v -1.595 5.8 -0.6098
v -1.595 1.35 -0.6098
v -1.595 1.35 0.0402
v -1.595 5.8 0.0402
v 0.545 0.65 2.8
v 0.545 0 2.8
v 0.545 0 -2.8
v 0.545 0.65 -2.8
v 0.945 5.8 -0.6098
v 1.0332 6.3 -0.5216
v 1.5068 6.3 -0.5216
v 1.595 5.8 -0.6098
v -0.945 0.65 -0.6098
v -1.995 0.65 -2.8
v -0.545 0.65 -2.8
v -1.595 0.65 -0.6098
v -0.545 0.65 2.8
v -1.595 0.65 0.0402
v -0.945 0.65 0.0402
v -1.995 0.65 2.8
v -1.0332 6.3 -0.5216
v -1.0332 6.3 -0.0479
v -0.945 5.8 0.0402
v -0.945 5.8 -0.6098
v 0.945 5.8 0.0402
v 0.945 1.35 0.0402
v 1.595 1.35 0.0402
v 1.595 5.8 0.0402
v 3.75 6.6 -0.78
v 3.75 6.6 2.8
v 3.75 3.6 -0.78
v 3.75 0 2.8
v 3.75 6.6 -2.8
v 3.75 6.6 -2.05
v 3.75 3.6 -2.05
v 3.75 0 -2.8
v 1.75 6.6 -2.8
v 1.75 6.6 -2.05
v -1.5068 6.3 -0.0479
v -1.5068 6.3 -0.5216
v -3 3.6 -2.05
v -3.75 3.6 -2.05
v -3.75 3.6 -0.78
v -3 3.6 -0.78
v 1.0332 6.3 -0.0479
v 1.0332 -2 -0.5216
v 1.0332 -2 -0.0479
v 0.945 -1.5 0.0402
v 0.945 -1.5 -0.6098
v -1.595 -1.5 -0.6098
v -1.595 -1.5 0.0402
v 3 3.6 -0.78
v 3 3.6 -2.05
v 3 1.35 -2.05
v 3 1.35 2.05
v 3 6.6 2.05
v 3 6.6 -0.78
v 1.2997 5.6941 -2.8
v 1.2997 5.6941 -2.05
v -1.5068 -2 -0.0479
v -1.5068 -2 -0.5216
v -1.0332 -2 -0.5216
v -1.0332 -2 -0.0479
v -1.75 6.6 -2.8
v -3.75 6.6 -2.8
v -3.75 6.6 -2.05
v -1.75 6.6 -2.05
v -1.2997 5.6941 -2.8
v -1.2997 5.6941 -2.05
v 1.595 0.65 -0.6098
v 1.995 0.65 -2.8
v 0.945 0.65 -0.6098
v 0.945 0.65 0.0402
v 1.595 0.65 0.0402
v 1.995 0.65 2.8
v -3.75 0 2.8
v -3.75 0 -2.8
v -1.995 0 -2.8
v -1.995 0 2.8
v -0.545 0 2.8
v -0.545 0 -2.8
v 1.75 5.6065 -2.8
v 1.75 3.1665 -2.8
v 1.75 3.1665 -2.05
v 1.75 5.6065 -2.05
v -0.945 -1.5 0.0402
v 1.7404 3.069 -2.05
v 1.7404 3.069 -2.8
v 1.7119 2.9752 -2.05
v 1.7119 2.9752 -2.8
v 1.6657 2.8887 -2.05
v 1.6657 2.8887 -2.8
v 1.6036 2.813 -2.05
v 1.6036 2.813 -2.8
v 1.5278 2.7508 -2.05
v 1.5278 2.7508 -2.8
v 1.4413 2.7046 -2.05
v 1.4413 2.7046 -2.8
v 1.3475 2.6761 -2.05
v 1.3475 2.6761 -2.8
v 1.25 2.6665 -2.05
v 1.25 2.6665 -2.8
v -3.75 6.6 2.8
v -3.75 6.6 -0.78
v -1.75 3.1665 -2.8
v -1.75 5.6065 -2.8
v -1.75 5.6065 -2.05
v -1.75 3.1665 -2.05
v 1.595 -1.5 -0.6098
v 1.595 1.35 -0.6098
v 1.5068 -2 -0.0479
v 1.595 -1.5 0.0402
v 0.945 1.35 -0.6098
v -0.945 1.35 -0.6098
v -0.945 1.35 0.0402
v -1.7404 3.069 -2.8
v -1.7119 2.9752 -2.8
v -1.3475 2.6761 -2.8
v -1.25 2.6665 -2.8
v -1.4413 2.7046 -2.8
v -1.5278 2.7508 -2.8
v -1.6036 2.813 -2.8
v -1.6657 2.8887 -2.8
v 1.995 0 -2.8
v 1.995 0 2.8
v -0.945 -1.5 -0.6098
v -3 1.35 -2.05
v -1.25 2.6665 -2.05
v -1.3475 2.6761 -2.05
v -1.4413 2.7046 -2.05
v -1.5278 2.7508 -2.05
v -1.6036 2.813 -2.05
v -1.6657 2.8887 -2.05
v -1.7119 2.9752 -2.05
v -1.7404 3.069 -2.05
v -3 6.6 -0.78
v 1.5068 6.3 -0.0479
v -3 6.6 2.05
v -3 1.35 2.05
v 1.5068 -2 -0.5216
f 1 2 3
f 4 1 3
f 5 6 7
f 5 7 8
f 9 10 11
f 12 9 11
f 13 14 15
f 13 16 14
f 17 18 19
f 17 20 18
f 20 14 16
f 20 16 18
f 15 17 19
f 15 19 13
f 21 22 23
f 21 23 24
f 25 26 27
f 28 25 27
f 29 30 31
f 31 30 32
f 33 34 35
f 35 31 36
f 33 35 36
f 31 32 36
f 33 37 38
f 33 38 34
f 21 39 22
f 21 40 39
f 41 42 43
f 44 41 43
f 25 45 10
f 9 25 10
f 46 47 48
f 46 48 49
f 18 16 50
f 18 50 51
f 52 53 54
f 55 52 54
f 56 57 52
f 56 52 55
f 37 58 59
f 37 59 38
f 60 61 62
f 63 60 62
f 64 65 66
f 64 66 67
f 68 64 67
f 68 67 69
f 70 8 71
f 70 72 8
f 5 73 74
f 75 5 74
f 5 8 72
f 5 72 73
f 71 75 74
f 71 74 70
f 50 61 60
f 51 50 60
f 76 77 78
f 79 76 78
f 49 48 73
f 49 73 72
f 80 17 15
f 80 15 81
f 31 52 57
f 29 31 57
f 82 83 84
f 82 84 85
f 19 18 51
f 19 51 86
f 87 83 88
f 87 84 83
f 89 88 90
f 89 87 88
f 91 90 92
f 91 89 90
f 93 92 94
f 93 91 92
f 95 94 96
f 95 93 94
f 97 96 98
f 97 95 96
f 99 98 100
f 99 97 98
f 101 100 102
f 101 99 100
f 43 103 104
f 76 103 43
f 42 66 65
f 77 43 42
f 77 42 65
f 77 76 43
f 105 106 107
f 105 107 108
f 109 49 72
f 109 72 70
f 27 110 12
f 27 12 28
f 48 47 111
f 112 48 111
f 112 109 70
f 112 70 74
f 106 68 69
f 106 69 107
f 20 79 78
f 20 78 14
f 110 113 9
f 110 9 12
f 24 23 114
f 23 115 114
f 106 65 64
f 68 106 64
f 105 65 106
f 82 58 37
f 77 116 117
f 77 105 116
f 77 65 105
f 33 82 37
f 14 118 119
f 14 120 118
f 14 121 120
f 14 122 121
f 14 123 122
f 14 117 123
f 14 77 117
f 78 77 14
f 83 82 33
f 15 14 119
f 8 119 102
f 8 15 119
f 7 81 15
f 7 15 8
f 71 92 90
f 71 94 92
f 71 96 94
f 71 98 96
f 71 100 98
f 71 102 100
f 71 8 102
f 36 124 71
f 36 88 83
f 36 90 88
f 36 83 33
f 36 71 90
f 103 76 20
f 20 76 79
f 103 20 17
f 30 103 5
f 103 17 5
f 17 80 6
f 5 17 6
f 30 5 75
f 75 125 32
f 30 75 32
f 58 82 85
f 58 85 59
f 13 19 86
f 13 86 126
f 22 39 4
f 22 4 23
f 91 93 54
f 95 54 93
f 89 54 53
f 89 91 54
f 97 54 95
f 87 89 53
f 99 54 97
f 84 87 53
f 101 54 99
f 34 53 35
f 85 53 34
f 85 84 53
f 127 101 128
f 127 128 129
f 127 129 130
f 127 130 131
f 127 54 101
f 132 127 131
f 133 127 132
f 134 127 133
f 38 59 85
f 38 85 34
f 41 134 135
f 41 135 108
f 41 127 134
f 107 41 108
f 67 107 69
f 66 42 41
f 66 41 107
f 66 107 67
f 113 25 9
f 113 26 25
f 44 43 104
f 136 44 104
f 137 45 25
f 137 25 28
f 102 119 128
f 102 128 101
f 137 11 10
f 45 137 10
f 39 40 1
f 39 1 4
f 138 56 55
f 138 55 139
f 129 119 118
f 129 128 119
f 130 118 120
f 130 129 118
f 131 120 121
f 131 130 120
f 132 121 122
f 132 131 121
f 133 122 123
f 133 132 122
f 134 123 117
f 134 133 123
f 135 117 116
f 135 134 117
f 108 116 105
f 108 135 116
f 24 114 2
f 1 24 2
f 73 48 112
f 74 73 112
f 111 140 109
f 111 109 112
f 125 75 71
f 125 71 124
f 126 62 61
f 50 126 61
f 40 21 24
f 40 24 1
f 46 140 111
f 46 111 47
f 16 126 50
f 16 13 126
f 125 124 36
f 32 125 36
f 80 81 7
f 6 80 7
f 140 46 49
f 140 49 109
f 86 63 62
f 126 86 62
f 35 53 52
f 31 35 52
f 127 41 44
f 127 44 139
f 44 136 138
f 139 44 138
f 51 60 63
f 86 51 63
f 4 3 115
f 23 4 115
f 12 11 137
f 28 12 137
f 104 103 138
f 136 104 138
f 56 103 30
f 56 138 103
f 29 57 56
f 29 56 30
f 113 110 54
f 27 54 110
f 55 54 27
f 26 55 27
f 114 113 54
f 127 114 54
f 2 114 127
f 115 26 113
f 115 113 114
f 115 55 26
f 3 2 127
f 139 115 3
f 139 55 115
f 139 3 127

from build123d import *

# Parameters (mm, degrees)
SKETCH1_W              = 7.5
SKETCH1_H              = 5.6
EXTRUDE1_DEPTH         = 6.6
CUT_EXTRUDE1_DEPTH     = 6.6
SKETCH3_W              = 6
SKETCH3_H              = 4.1
CUT_EXTRUDE2_DEPTH     = 5.25
SKETCH5_W              = 1.27
SKETCH5_H              = 3
CUT_EXTRUDE3_DEPTH     = 8.5
CUT_EXTRUDE4_DEPTH     = 1.2
FILLET1_R              = 0.5
EXTRUDE2_DEPTH         = 6.3
EXTRUDE2_DEPTH_BACK    = 2
CHAMFER1_SIZE          = 0.5
CHAMFER1_SIZE2         = 0.08816349
CHAMFER1_PART_2_SIZE   = 0.5
CHAMFER1_PART_2_SIZE2  = 0.08816349
CHAMFER1_PART_3_SIZE   = 0.5
CHAMFER1_PART_3_SIZE2  = 0.08816349
CHAMFER1_PART_4_SIZE   = 0.5
CHAMFER1_PART_4_SIZE2  = 0.08816349
CHAMFER1_PART_5_SIZE   = 0.5
CHAMFER1_PART_5_SIZE2  = 0.08816349
CHAMFER1_PART_6_SIZE   = 0.5
CHAMFER1_PART_6_SIZE2  = 0.08816349
CHAMFER1_PART_7_SIZE   = 0.5
CHAMFER1_PART_7_SIZE2  = 0.08816349
CHAMFER1_PART_8_SIZE   = 0.5
CHAMFER1_PART_8_SIZE2  = 0.08816349
CHAMFER1_PART_9_SIZE   = 0.5
CHAMFER1_PART_9_SIZE2  = 0.08816349
CHAMFER1_PART_10_SIZE  = 0.5
CHAMFER1_PART_10_SIZE2 = 0.08816349
CHAMFER1_PART_11_SIZE  = 0.5
CHAMFER1_PART_11_SIZE2 = 0.08816349
CHAMFER1_PART_12_SIZE  = 0.5
CHAMFER1_PART_12_SIZE2 = 0.08816349
CHAMFER1_PART_13_SIZE  = 0.5
CHAMFER1_PART_13_SIZE2 = 0.08816349
CHAMFER1_PART_14_SIZE  = 0.5
CHAMFER1_PART_14_SIZE2 = 0.08816349
CHAMFER1_PART_15_SIZE  = 0.5
CHAMFER1_PART_15_SIZE2 = 0.08816349
CHAMFER1_PART_16_SIZE  = 0.5
CHAMFER1_PART_16_SIZE2 = 0.08816349


with BuildPart() as part:
    # Sketch1 → Extrude1 (new body)
    with BuildSketch(Plane(origin=(0, 0, 0), x_dir=(1, 0, 0), z_dir=(0, 1, 0))):
        Rectangle(SKETCH1_W, SKETCH1_H)
    extrude(amount=EXTRUDE1_DEPTH)

    # Sketch2 → Cut-Extrude1 (cut, through all)
    with BuildSketch(Plane.XY.offset(2.8)):
        Polygon((-1.995, 0.65), (-0.545, 0.65), (-0.545, 0), (-1.27, 0), (-1.995, 0), align=None)
        Polygon((0.545, 0.65), (1.995, 0.65), (1.995, 0), (1.27, 0), (0.545, 0), align=None)
    extrude(amount=-CUT_EXTRUDE1_DEPTH, mode=Mode.SUBTRACT)

    # Sketch3 → Cut-Extrude2 (cut)
    with BuildSketch(Plane(origin=(0, 6.6, 0), x_dir=(-1, 0, 0), z_dir=(0, 1, 0))):
        Rectangle(SKETCH3_W, SKETCH3_H)
    extrude(amount=-CUT_EXTRUDE2_DEPTH, mode=Mode.SUBTRACT)

    # Sketch5 → Cut-Extrude3 (cut, through all)
    with BuildSketch(Plane.ZY.offset(3.75)):
        with Locations((-1.415, 5.1)):
            Rectangle(SKETCH5_W, SKETCH5_H)
    extrude(amount=-CUT_EXTRUDE3_DEPTH, mode=Mode.SUBTRACT)

    # Sketch6 → Cut-Extrude4 (cut)
    with BuildSketch(Plane(origin=(0, 0, -2.8), x_dir=(-1, 0, 0), z_dir=(0, 0, -1))):
        Polygon((-1.75, 6.6), (1.75, 6.6), (1.299695014, 5.694073356), (1.75, 5.606485511), (1.75, 2.666508092), (-1.75, 2.666508092), (-1.75, 5.606485511), (-1.299695014, 5.694073356), align=None)
    extrude(amount=-CUT_EXTRUDE4_DEPTH, mode=Mode.SUBTRACT)

    # Fillet1
    fillet1_edges = [part.edges().sort_by_distance(p)[0] for p in [
        (-1.75, 2.666508092, -2.425),
        (1.75, 2.666508092, -2.425),
    ]]
    fillet(fillet1_edges, radius=FILLET1_R)

    # Sketch7 → Extrude2 (add, two sides)
    with BuildSketch(Plane(origin=(0, 0, 0), x_dir=(1, 0, 0), z_dir=(0, 1, 0))) as extrude2_sk:
        Polygon((-1.27, -0.040243902), (-0.945, -0.040243902), (-0.945, 0.609756098), (-1.595, 0.609756098), (-1.595, -0.040243902), align=None)
        Polygon((1.27, -0.040243902), (0.945, -0.040243902), (0.945, 0.609756098), (1.595, 0.609756098), (1.595, -0.040243902), align=None)
    extrude(amount=EXTRUDE2_DEPTH)
    extrude(extrude2_sk.sketch, amount=-EXTRUDE2_DEPTH_BACK)

    # Chamfer1
    chamfer1_edges = [part.edges().sort_by_distance(p)[0] for p in [
        (-1.595, -2, -0.284756098),
    ]]
    chamfer1_side = [part.faces().sort_by_distance(p)[0] for p in [
        (-1.595, -0.675, -0.284756098),
    ]]
    chamfer(chamfer1_edges, length=CHAMFER1_SIZE, length2=CHAMFER1_SIZE2, reference=chamfer1_side[0])

    # Chamfer1 part 2
    chamfer1_part_2_edges = [part.edges().sort_by_distance(p)[0] for p in [
        (-1.27, -2, 0.040243902),
    ]]
    chamfer1_part_2_side = [part.faces().sort_by_distance(p)[0] for p in [
        (-1.27, -0.675, 0.040243902),
    ]]
    chamfer(chamfer1_part_2_edges, length=CHAMFER1_PART_2_SIZE, length2=CHAMFER1_PART_2_SIZE2, reference=chamfer1_part_2_side[0])

    # Chamfer1 part 3
    chamfer1_part_3_edges = [part.edges().sort_by_distance(p)[0] for p in [
        (-0.945, -2, -0.284756098),
    ]]
    chamfer1_part_3_side = [part.faces().sort_by_distance(p)[0] for p in [
        (-0.945, -0.675, -0.284756098),
    ]]
    chamfer(chamfer1_part_3_edges, length=CHAMFER1_PART_3_SIZE, length2=CHAMFER1_PART_3_SIZE2, reference=chamfer1_part_3_side[0])

    # Chamfer1 part 4
    chamfer1_part_4_edges = [part.edges().sort_by_distance(p)[0] for p in [
        (-1.27, -2, -0.609756098),
    ]]
    chamfer1_part_4_side = [part.faces().sort_by_distance(p)[0] for p in [
        (-1.27, -0.675, -0.609756098),
    ]]
    chamfer(chamfer1_part_4_edges, length=CHAMFER1_PART_4_SIZE, length2=CHAMFER1_PART_4_SIZE2, reference=chamfer1_part_4_side[0])

    # Chamfer1 part 5
    chamfer1_part_5_edges = [part.edges().sort_by_distance(p)[0] for p in [
        (-1.27, 6.3, -0.609756098),
    ]]
    chamfer1_part_5_side = [part.faces().sort_by_distance(p)[0] for p in [
        (-1.27, 3.825, -0.609756098),
    ]]
    chamfer(chamfer1_part_5_edges, length=CHAMFER1_PART_5_SIZE, length2=CHAMFER1_PART_5_SIZE2, reference=chamfer1_part_5_side[0])

    # Chamfer1 part 6
    chamfer1_part_6_edges = [part.edges().sort_by_distance(p)[0] for p in [
        (-1.595, 6.3, -0.284756098),
    ]]
    chamfer1_part_6_side = [part.faces().sort_by_distance(p)[0] for p in [
        (-1.595, 3.825, -0.284756098),
    ]]
    chamfer(chamfer1_part_6_edges, length=CHAMFER1_PART_6_SIZE, length2=CHAMFER1_PART_6_SIZE2, reference=chamfer1_part_6_side[0])

    # Chamfer1 part 7
    chamfer1_part_7_edges = [part.edges().sort_by_distance(p)[0] for p in [
        (-1.27, 6.3, 0.040243902),
    ]]
    chamfer1_part_7_side = [part.faces().sort_by_distance(p)[0] for p in [
        (-1.27, 3.825, 0.040243902),
    ]]
    chamfer(chamfer1_part_7_edges, length=CHAMFER1_PART_7_SIZE, length2=CHAMFER1_PART_7_SIZE2, reference=chamfer1_part_7_side[0])

    # Chamfer1 part 8
    chamfer1_part_8_edges = [part.edges().sort_by_distance(p)[0] for p in [
        (-0.945, 6.3, -0.284756098),
    ]]
    chamfer1_part_8_side = [part.faces().sort_by_distance(p)[0] for p in [
        (-0.945, 3.825, -0.284756098),
    ]]
    chamfer(chamfer1_part_8_edges, length=CHAMFER1_PART_8_SIZE, length2=CHAMFER1_PART_8_SIZE2, reference=chamfer1_part_8_side[0])

    # Chamfer1 part 9
    chamfer1_part_9_edges = [part.edges().sort_by_distance(p)[0] for p in [
        (1.595, -2, -0.284756098),
    ]]
    chamfer1_part_9_side = [part.faces().sort_by_distance(p)[0] for p in [
        (1.595, -0.675, -0.284756098),
    ]]
    chamfer(chamfer1_part_9_edges, length=CHAMFER1_PART_9_SIZE, length2=CHAMFER1_PART_9_SIZE2, reference=chamfer1_part_9_side[0])

    # Chamfer1 part 10
    chamfer1_part_10_edges = [part.edges().sort_by_distance(p)[0] for p in [
        (1.27, -2, -0.609756098),
    ]]
    chamfer1_part_10_side = [part.faces().sort_by_distance(p)[0] for p in [
        (1.27, -0.675, -0.609756098),
    ]]
    chamfer(chamfer1_part_10_edges, length=CHAMFER1_PART_10_SIZE, length2=CHAMFER1_PART_10_SIZE2, reference=chamfer1_part_10_side[0])

    # Chamfer1 part 11
    chamfer1_part_11_edges = [part.edges().sort_by_distance(p)[0] for p in [
        (0.945, -2, -0.284756098),
    ]]
    chamfer1_part_11_side = [part.faces().sort_by_distance(p)[0] for p in [
        (0.945, -0.675, -0.284756098),
    ]]
    chamfer(chamfer1_part_11_edges, length=CHAMFER1_PART_11_SIZE, length2=CHAMFER1_PART_11_SIZE2, reference=chamfer1_part_11_side[0])

    # Chamfer1 part 12
    chamfer1_part_12_edges = [part.edges().sort_by_distance(p)[0] for p in [
        (1.27, -2, 0.040243902),
    ]]
    chamfer1_part_12_side = [part.faces().sort_by_distance(p)[0] for p in [
        (1.27, -0.675, 0.040243902),
    ]]
    chamfer(chamfer1_part_12_edges, length=CHAMFER1_PART_12_SIZE, length2=CHAMFER1_PART_12_SIZE2, reference=chamfer1_part_12_side[0])

    # Chamfer1 part 13
    chamfer1_part_13_edges = [part.edges().sort_by_distance(p)[0] for p in [
        (1.27, 6.3, 0.040243902),
    ]]
    chamfer1_part_13_side = [part.faces().sort_by_distance(p)[0] for p in [
        (1.27, 3.825, 0.040243902),
    ]]
    chamfer(chamfer1_part_13_edges, length=CHAMFER1_PART_13_SIZE, length2=CHAMFER1_PART_13_SIZE2, reference=chamfer1_part_13_side[0])

    # Chamfer1 part 14
    chamfer1_part_14_edges = [part.edges().sort_by_distance(p)[0] for p in [
        (1.595, 6.3, -0.284756098),
    ]]
    chamfer1_part_14_side = [part.faces().sort_by_distance(p)[0] for p in [
        (1.595, 3.825, -0.284756098),
    ]]
    chamfer(chamfer1_part_14_edges, length=CHAMFER1_PART_14_SIZE, length2=CHAMFER1_PART_14_SIZE2, reference=chamfer1_part_14_side[0])

    # Chamfer1 part 15
    chamfer1_part_15_edges = [part.edges().sort_by_distance(p)[0] for p in [
        (1.27, 6.3, -0.609756098),
    ]]
    chamfer1_part_15_side = [part.faces().sort_by_distance(p)[0] for p in [
        (1.27, 3.825, -0.609756098),
    ]]
    chamfer(chamfer1_part_15_edges, length=CHAMFER1_PART_15_SIZE, length2=CHAMFER1_PART_15_SIZE2, reference=chamfer1_part_15_side[0])

    # Chamfer1 part 16
    chamfer1_part_16_edges = [part.edges().sort_by_distance(p)[0] for p in [
        (0.945, 6.3, -0.284756098),
    ]]
    chamfer1_part_16_side = [part.faces().sort_by_distance(p)[0] for p in [
        (0.945, 3.825, -0.284756098),
    ]]
    chamfer(chamfer1_part_16_edges, length=CHAMFER1_PART_16_SIZE, length2=CHAMFER1_PART_16_SIZE2, reference=chamfer1_part_16_side[0])


solid = part.part
